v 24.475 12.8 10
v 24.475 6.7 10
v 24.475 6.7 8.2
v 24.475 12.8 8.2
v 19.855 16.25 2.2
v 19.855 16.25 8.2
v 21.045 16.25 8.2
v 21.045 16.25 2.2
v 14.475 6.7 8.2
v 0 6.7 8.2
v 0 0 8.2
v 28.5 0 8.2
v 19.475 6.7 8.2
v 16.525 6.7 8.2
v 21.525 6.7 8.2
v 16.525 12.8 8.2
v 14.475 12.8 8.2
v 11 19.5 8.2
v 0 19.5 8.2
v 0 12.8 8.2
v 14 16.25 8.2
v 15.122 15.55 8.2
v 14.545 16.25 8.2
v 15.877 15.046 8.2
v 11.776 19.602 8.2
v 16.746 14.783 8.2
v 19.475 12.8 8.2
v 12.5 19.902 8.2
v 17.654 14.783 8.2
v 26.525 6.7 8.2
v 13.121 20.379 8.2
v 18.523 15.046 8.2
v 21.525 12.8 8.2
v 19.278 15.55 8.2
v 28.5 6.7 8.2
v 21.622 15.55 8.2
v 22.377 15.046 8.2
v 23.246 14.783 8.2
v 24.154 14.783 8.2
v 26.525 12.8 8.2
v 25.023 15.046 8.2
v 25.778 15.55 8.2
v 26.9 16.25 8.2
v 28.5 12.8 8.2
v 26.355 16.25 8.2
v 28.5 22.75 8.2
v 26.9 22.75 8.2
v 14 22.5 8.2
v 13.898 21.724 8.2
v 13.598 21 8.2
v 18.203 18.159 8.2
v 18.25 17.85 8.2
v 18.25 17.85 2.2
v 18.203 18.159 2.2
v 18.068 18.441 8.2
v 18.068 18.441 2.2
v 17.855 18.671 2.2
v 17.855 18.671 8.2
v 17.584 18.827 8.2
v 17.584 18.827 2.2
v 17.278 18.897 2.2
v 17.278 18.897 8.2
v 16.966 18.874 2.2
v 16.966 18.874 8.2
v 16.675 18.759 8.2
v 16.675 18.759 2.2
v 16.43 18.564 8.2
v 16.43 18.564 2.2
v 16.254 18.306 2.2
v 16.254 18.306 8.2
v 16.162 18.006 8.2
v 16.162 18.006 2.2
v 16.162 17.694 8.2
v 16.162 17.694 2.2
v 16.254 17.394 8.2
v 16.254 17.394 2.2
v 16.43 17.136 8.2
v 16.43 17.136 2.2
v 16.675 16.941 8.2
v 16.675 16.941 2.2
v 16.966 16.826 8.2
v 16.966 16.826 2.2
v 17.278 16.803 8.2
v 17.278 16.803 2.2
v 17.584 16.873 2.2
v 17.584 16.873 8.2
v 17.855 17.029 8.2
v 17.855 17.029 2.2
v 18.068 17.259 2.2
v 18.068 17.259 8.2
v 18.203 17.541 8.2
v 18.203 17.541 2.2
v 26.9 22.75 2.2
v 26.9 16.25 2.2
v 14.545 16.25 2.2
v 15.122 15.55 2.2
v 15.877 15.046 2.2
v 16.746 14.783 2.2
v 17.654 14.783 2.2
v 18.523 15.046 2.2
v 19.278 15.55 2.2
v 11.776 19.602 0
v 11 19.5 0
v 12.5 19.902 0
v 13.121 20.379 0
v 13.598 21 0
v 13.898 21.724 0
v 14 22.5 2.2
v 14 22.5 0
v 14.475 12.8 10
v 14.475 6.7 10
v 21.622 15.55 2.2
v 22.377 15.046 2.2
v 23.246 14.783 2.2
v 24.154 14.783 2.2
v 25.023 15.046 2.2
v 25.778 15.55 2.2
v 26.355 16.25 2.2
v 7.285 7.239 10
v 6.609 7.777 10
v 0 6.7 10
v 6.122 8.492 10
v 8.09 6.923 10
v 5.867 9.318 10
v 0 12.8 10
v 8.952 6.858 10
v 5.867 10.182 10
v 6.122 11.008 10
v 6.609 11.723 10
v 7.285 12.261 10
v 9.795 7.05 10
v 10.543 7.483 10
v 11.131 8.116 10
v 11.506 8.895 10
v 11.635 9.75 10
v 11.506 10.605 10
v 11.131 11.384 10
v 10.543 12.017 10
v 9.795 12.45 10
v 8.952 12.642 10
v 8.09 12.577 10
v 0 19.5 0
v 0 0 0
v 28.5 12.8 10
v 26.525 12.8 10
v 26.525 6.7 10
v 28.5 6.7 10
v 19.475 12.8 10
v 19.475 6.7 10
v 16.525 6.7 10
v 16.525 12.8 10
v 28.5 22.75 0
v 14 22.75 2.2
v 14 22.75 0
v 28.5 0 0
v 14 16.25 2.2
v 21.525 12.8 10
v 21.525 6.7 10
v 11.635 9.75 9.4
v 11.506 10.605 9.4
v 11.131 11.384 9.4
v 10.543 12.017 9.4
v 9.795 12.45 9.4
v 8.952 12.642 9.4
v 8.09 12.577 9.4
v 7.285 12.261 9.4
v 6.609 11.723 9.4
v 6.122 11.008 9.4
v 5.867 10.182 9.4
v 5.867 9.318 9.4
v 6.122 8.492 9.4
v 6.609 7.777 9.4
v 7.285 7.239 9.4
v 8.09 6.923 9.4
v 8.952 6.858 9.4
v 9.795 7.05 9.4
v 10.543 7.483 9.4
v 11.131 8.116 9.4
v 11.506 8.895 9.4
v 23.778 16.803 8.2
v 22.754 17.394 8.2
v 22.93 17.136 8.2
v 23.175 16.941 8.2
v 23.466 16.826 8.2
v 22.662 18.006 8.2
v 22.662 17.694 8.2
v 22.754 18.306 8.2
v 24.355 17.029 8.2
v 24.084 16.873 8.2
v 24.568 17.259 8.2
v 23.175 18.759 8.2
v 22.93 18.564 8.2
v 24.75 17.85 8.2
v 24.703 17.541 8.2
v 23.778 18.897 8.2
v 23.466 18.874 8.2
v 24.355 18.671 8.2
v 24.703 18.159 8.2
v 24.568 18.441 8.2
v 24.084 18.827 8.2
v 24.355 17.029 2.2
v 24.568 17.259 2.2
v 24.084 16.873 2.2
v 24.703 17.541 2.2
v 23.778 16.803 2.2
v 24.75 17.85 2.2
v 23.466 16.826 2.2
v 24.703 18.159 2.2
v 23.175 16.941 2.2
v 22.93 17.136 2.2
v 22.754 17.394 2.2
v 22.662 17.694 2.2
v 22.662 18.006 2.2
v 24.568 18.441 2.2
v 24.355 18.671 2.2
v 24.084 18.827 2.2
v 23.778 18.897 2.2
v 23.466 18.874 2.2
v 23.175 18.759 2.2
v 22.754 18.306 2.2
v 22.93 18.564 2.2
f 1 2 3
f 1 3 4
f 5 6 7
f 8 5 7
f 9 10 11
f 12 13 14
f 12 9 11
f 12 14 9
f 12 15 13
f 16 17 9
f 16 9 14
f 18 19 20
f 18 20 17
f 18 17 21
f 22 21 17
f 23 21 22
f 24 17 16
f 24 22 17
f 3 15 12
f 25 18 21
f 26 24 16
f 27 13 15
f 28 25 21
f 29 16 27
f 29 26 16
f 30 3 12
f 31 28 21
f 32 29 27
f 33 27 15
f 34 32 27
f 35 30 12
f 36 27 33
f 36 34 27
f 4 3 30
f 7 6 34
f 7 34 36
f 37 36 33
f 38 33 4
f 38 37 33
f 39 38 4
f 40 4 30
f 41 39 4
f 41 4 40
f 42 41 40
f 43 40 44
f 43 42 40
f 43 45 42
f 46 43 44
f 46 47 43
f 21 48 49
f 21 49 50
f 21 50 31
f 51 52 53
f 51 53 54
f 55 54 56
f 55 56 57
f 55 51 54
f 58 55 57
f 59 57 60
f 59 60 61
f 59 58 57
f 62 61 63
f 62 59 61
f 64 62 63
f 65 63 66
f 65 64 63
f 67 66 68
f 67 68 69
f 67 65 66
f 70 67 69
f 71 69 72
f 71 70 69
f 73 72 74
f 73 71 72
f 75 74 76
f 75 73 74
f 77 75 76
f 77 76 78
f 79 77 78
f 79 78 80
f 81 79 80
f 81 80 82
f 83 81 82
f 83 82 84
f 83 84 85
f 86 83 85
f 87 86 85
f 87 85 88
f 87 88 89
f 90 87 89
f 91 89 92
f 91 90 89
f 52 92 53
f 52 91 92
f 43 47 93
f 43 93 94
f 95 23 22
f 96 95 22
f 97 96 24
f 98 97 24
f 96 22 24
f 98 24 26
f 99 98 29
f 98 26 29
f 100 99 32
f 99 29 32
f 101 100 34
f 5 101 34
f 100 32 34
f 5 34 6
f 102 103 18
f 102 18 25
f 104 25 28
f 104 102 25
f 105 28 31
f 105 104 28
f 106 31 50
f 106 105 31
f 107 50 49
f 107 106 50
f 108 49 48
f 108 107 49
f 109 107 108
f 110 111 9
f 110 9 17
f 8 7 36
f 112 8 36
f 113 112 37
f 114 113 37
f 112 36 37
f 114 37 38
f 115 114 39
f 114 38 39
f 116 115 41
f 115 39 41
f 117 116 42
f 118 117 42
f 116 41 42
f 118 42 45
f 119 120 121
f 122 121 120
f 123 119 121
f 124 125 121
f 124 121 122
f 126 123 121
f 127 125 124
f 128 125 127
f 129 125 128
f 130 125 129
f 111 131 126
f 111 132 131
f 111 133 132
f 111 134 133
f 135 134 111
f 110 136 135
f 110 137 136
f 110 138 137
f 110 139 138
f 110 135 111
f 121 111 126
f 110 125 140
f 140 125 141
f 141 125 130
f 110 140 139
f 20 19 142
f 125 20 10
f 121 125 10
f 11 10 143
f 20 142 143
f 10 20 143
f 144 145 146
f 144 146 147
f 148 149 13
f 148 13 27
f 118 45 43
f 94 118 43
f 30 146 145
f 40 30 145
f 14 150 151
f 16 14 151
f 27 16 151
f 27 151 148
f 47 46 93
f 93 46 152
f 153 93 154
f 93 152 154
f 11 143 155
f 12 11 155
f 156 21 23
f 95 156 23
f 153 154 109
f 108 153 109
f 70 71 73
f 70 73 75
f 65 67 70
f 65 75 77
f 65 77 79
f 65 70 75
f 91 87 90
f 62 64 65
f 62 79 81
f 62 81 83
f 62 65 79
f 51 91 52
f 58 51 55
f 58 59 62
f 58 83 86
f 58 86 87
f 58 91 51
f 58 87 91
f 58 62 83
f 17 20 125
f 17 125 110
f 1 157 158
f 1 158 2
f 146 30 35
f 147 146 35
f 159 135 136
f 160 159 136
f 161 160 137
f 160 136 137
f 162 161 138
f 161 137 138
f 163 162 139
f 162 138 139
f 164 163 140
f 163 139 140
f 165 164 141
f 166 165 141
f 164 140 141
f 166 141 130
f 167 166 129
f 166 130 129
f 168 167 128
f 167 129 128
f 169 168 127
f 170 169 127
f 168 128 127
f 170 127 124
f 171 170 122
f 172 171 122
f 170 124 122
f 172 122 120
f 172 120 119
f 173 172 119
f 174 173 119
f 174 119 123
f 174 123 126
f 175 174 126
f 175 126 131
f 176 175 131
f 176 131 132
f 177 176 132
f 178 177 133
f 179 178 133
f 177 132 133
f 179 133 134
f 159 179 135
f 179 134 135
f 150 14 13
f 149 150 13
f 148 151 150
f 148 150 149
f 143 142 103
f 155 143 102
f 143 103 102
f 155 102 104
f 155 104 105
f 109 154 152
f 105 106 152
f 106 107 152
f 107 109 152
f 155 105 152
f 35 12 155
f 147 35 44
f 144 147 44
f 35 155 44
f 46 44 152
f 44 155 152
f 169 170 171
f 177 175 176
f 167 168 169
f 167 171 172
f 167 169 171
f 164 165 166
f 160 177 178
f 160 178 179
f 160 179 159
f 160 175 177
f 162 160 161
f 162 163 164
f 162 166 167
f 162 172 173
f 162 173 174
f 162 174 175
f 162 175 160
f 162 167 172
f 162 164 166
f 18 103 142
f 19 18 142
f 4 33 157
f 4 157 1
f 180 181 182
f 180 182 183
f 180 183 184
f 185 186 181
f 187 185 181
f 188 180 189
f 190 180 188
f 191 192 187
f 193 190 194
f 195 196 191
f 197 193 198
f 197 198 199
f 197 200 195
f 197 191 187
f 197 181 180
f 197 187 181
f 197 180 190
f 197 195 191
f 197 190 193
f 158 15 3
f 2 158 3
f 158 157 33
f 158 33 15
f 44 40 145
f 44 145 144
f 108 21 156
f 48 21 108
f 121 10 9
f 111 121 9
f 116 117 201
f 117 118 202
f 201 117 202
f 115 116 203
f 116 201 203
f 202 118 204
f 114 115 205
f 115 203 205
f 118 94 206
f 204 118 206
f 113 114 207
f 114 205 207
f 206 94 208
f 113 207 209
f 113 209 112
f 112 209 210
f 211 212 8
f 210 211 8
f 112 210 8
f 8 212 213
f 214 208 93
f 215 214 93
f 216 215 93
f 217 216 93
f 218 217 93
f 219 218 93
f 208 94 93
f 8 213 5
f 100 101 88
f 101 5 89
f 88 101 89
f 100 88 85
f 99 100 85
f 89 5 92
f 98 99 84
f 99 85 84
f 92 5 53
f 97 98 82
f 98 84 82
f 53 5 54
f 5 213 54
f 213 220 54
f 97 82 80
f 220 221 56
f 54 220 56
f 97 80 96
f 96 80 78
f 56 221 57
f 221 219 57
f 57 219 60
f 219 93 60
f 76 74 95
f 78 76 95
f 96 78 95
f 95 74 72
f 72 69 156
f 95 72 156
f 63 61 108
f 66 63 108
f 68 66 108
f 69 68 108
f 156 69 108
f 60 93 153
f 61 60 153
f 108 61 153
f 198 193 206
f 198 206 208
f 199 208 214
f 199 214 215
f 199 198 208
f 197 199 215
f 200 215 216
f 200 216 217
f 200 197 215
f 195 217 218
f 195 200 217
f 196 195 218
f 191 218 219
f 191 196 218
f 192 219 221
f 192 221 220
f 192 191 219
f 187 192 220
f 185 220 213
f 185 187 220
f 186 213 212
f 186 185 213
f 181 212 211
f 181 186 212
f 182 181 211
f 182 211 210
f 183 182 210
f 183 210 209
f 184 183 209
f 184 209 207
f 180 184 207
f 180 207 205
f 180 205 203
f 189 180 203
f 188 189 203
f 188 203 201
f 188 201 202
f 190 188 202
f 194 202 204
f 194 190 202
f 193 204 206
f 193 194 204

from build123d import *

# Parameters (mm, degrees)
PAD004_DEPTH    = 8.2
SKETCH014_W     = 28.5
SKETCH014_H     = 6.1
PAD005_DEPTH    = 1.8
SKETCH015_R     = 2.9
POCKET004_DEPTH = 0.6
SKETCH016_W     = 2.05
SKETCH016_H     = 6.1
POCKET005_DEPTH = 1.8
SKETCH018_R     = 1.05
POCKET007_DEPTH = 6


with BuildPart() as part:
    # Sketch013 → Pad004 (new body)
    with BuildSketch(Plane.XY):
        with BuildLine():
            Line((0, 0), (28.5, 0))
            Line((28.5, 0), (28.5, 22.75))
            Line((28.5, 22.75), (14, 22.75))
            Line((14, 22.75), (14, 22.5))
            ThreePointArc((11, 19.5), (13.12132, 20.37868), (14, 22.5))
            Line((11, 19.5), (0, 19.5))
            Line((0, 19.5), (0, 0))
        make_face()
    extrude(amount=PAD004_DEPTH)

    # Sketch014 (on Face9 of Pad004) → Pad005 (join)
    with BuildSketch(Plane.XY.offset(8.2)):
        with Locations((14.25, 9.75)):
            Rectangle(SKETCH014_W, SKETCH014_H)
    extrude(amount=PAD005_DEPTH)

    # Sketch015 (on Face11 of Pad005) → Pocket004 (cut)
    with BuildSketch(Plane.XY.offset(10)):
        with Locations((8.735056, 9.75)):
            Circle(SKETCH015_R)
    extrude(amount=-POCKET004_DEPTH, mode=Mode.SUBTRACT)

    # Sketch016 (on Face10 of Pocket004) → Pocket005 (cut)
    with BuildSketch(Plane.XY.offset(10)):
        with Locations((15.5, 9.75)):
            Rectangle(SKETCH016_W, SKETCH016_H)
        Polygon((21.525, 12.8), (21.525, 6.7), (19.475, 6.7), (19.475, 12.8), (20.5, 12.8), align=None)
        with Locations((25.5, 9.75)):
            Rectangle(SKETCH016_W, SKETCH016_H)
    extrude(amount=-POCKET005_DEPTH, mode=Mode.SUBTRACT)

    # Sketch018 (on Face19 of Clone001) → Pocket007 (cut)
    with BuildSketch(Plane.XY.offset(8.2)):
        with BuildLine():
            Line((14, 22.75), (26.9, 22.75))
            Line((26.9, 22.75), (26.9, 16.25))
            Line((26.355184, 16.25), (26.9, 16.25))
            ThreePointArc((21.044816, 16.25), (23.7, 14.75), (26.355184, 16.25))
            Line((20.45, 16.25), (21.044816, 16.25))
            Line((19.855184, 16.25), (20.45, 16.25))
            ThreePointArc((14.544816, 16.25), (17.2, 14.75), (19.855184, 16.25))
            Line((14, 16.25), (14.544816, 16.25))
            Line((14, 16.25), (14, 22.75))
        make_face()
        with Locations((17.2, 17.85)):
            Circle(SKETCH018_R, mode=Mode.SUBTRACT)
        with Locations((23.7, 17.85)):
            Circle(SKETCH018_R, mode=Mode.SUBTRACT)
    extrude(amount=-POCKET007_DEPTH, mode=Mode.SUBTRACT)


solid = part.part
